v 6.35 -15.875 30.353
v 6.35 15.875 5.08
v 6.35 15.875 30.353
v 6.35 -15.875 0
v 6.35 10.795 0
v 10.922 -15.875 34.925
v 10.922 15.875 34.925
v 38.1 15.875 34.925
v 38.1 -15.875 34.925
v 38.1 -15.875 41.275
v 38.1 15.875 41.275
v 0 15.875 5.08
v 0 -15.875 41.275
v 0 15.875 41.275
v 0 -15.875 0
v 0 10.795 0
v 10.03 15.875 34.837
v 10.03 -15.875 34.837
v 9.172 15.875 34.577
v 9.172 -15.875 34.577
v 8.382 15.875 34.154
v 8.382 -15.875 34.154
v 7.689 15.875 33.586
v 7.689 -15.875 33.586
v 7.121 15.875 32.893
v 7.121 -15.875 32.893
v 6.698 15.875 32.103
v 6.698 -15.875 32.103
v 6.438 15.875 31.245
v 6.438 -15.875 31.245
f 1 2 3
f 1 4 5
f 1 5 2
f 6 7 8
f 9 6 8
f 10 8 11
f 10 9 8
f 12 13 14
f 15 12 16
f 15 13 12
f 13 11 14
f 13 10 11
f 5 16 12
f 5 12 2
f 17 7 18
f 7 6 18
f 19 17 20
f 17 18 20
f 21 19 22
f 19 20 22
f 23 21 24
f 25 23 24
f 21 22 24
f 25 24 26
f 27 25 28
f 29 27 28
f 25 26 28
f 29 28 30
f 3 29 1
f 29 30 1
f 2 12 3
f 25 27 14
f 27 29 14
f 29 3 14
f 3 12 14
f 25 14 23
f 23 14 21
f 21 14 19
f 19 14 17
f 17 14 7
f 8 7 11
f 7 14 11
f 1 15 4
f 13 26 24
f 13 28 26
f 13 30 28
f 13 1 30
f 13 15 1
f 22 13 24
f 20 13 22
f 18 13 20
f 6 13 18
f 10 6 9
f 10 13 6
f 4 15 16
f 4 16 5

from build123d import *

# Parameters (mm, degrees)
F1_DEPTH = 15.875
F2_R     = 4.572
F3_SIZE  = 5.08


with BuildPart() as f1:
    # F0 (on Front) → F1 (new body, symmetric)
    with BuildSketch(Plane.XZ):
        Polygon((0, 41.275), (0, 0), (6.35, 0), (6.35, 34.925), (38.1, 34.925), (38.1, 41.275), align=None)
    extrude(amount=F1_DEPTH, both=True)

    # F2
    f2_edges = [f1.edges().sort_by_distance(p)[0] for p in [
        (6.35, 0, 34.925),
    ]]
    fillet(f2_edges, radius=F2_R)

    # F3
    f3_edges = [f1.edges().sort_by_distance(p)[0] for p in [
        (3.175, 15.875, 0),
    ]]
    chamfer(f3_edges, length=F3_SIZE)


solid = f1.part
